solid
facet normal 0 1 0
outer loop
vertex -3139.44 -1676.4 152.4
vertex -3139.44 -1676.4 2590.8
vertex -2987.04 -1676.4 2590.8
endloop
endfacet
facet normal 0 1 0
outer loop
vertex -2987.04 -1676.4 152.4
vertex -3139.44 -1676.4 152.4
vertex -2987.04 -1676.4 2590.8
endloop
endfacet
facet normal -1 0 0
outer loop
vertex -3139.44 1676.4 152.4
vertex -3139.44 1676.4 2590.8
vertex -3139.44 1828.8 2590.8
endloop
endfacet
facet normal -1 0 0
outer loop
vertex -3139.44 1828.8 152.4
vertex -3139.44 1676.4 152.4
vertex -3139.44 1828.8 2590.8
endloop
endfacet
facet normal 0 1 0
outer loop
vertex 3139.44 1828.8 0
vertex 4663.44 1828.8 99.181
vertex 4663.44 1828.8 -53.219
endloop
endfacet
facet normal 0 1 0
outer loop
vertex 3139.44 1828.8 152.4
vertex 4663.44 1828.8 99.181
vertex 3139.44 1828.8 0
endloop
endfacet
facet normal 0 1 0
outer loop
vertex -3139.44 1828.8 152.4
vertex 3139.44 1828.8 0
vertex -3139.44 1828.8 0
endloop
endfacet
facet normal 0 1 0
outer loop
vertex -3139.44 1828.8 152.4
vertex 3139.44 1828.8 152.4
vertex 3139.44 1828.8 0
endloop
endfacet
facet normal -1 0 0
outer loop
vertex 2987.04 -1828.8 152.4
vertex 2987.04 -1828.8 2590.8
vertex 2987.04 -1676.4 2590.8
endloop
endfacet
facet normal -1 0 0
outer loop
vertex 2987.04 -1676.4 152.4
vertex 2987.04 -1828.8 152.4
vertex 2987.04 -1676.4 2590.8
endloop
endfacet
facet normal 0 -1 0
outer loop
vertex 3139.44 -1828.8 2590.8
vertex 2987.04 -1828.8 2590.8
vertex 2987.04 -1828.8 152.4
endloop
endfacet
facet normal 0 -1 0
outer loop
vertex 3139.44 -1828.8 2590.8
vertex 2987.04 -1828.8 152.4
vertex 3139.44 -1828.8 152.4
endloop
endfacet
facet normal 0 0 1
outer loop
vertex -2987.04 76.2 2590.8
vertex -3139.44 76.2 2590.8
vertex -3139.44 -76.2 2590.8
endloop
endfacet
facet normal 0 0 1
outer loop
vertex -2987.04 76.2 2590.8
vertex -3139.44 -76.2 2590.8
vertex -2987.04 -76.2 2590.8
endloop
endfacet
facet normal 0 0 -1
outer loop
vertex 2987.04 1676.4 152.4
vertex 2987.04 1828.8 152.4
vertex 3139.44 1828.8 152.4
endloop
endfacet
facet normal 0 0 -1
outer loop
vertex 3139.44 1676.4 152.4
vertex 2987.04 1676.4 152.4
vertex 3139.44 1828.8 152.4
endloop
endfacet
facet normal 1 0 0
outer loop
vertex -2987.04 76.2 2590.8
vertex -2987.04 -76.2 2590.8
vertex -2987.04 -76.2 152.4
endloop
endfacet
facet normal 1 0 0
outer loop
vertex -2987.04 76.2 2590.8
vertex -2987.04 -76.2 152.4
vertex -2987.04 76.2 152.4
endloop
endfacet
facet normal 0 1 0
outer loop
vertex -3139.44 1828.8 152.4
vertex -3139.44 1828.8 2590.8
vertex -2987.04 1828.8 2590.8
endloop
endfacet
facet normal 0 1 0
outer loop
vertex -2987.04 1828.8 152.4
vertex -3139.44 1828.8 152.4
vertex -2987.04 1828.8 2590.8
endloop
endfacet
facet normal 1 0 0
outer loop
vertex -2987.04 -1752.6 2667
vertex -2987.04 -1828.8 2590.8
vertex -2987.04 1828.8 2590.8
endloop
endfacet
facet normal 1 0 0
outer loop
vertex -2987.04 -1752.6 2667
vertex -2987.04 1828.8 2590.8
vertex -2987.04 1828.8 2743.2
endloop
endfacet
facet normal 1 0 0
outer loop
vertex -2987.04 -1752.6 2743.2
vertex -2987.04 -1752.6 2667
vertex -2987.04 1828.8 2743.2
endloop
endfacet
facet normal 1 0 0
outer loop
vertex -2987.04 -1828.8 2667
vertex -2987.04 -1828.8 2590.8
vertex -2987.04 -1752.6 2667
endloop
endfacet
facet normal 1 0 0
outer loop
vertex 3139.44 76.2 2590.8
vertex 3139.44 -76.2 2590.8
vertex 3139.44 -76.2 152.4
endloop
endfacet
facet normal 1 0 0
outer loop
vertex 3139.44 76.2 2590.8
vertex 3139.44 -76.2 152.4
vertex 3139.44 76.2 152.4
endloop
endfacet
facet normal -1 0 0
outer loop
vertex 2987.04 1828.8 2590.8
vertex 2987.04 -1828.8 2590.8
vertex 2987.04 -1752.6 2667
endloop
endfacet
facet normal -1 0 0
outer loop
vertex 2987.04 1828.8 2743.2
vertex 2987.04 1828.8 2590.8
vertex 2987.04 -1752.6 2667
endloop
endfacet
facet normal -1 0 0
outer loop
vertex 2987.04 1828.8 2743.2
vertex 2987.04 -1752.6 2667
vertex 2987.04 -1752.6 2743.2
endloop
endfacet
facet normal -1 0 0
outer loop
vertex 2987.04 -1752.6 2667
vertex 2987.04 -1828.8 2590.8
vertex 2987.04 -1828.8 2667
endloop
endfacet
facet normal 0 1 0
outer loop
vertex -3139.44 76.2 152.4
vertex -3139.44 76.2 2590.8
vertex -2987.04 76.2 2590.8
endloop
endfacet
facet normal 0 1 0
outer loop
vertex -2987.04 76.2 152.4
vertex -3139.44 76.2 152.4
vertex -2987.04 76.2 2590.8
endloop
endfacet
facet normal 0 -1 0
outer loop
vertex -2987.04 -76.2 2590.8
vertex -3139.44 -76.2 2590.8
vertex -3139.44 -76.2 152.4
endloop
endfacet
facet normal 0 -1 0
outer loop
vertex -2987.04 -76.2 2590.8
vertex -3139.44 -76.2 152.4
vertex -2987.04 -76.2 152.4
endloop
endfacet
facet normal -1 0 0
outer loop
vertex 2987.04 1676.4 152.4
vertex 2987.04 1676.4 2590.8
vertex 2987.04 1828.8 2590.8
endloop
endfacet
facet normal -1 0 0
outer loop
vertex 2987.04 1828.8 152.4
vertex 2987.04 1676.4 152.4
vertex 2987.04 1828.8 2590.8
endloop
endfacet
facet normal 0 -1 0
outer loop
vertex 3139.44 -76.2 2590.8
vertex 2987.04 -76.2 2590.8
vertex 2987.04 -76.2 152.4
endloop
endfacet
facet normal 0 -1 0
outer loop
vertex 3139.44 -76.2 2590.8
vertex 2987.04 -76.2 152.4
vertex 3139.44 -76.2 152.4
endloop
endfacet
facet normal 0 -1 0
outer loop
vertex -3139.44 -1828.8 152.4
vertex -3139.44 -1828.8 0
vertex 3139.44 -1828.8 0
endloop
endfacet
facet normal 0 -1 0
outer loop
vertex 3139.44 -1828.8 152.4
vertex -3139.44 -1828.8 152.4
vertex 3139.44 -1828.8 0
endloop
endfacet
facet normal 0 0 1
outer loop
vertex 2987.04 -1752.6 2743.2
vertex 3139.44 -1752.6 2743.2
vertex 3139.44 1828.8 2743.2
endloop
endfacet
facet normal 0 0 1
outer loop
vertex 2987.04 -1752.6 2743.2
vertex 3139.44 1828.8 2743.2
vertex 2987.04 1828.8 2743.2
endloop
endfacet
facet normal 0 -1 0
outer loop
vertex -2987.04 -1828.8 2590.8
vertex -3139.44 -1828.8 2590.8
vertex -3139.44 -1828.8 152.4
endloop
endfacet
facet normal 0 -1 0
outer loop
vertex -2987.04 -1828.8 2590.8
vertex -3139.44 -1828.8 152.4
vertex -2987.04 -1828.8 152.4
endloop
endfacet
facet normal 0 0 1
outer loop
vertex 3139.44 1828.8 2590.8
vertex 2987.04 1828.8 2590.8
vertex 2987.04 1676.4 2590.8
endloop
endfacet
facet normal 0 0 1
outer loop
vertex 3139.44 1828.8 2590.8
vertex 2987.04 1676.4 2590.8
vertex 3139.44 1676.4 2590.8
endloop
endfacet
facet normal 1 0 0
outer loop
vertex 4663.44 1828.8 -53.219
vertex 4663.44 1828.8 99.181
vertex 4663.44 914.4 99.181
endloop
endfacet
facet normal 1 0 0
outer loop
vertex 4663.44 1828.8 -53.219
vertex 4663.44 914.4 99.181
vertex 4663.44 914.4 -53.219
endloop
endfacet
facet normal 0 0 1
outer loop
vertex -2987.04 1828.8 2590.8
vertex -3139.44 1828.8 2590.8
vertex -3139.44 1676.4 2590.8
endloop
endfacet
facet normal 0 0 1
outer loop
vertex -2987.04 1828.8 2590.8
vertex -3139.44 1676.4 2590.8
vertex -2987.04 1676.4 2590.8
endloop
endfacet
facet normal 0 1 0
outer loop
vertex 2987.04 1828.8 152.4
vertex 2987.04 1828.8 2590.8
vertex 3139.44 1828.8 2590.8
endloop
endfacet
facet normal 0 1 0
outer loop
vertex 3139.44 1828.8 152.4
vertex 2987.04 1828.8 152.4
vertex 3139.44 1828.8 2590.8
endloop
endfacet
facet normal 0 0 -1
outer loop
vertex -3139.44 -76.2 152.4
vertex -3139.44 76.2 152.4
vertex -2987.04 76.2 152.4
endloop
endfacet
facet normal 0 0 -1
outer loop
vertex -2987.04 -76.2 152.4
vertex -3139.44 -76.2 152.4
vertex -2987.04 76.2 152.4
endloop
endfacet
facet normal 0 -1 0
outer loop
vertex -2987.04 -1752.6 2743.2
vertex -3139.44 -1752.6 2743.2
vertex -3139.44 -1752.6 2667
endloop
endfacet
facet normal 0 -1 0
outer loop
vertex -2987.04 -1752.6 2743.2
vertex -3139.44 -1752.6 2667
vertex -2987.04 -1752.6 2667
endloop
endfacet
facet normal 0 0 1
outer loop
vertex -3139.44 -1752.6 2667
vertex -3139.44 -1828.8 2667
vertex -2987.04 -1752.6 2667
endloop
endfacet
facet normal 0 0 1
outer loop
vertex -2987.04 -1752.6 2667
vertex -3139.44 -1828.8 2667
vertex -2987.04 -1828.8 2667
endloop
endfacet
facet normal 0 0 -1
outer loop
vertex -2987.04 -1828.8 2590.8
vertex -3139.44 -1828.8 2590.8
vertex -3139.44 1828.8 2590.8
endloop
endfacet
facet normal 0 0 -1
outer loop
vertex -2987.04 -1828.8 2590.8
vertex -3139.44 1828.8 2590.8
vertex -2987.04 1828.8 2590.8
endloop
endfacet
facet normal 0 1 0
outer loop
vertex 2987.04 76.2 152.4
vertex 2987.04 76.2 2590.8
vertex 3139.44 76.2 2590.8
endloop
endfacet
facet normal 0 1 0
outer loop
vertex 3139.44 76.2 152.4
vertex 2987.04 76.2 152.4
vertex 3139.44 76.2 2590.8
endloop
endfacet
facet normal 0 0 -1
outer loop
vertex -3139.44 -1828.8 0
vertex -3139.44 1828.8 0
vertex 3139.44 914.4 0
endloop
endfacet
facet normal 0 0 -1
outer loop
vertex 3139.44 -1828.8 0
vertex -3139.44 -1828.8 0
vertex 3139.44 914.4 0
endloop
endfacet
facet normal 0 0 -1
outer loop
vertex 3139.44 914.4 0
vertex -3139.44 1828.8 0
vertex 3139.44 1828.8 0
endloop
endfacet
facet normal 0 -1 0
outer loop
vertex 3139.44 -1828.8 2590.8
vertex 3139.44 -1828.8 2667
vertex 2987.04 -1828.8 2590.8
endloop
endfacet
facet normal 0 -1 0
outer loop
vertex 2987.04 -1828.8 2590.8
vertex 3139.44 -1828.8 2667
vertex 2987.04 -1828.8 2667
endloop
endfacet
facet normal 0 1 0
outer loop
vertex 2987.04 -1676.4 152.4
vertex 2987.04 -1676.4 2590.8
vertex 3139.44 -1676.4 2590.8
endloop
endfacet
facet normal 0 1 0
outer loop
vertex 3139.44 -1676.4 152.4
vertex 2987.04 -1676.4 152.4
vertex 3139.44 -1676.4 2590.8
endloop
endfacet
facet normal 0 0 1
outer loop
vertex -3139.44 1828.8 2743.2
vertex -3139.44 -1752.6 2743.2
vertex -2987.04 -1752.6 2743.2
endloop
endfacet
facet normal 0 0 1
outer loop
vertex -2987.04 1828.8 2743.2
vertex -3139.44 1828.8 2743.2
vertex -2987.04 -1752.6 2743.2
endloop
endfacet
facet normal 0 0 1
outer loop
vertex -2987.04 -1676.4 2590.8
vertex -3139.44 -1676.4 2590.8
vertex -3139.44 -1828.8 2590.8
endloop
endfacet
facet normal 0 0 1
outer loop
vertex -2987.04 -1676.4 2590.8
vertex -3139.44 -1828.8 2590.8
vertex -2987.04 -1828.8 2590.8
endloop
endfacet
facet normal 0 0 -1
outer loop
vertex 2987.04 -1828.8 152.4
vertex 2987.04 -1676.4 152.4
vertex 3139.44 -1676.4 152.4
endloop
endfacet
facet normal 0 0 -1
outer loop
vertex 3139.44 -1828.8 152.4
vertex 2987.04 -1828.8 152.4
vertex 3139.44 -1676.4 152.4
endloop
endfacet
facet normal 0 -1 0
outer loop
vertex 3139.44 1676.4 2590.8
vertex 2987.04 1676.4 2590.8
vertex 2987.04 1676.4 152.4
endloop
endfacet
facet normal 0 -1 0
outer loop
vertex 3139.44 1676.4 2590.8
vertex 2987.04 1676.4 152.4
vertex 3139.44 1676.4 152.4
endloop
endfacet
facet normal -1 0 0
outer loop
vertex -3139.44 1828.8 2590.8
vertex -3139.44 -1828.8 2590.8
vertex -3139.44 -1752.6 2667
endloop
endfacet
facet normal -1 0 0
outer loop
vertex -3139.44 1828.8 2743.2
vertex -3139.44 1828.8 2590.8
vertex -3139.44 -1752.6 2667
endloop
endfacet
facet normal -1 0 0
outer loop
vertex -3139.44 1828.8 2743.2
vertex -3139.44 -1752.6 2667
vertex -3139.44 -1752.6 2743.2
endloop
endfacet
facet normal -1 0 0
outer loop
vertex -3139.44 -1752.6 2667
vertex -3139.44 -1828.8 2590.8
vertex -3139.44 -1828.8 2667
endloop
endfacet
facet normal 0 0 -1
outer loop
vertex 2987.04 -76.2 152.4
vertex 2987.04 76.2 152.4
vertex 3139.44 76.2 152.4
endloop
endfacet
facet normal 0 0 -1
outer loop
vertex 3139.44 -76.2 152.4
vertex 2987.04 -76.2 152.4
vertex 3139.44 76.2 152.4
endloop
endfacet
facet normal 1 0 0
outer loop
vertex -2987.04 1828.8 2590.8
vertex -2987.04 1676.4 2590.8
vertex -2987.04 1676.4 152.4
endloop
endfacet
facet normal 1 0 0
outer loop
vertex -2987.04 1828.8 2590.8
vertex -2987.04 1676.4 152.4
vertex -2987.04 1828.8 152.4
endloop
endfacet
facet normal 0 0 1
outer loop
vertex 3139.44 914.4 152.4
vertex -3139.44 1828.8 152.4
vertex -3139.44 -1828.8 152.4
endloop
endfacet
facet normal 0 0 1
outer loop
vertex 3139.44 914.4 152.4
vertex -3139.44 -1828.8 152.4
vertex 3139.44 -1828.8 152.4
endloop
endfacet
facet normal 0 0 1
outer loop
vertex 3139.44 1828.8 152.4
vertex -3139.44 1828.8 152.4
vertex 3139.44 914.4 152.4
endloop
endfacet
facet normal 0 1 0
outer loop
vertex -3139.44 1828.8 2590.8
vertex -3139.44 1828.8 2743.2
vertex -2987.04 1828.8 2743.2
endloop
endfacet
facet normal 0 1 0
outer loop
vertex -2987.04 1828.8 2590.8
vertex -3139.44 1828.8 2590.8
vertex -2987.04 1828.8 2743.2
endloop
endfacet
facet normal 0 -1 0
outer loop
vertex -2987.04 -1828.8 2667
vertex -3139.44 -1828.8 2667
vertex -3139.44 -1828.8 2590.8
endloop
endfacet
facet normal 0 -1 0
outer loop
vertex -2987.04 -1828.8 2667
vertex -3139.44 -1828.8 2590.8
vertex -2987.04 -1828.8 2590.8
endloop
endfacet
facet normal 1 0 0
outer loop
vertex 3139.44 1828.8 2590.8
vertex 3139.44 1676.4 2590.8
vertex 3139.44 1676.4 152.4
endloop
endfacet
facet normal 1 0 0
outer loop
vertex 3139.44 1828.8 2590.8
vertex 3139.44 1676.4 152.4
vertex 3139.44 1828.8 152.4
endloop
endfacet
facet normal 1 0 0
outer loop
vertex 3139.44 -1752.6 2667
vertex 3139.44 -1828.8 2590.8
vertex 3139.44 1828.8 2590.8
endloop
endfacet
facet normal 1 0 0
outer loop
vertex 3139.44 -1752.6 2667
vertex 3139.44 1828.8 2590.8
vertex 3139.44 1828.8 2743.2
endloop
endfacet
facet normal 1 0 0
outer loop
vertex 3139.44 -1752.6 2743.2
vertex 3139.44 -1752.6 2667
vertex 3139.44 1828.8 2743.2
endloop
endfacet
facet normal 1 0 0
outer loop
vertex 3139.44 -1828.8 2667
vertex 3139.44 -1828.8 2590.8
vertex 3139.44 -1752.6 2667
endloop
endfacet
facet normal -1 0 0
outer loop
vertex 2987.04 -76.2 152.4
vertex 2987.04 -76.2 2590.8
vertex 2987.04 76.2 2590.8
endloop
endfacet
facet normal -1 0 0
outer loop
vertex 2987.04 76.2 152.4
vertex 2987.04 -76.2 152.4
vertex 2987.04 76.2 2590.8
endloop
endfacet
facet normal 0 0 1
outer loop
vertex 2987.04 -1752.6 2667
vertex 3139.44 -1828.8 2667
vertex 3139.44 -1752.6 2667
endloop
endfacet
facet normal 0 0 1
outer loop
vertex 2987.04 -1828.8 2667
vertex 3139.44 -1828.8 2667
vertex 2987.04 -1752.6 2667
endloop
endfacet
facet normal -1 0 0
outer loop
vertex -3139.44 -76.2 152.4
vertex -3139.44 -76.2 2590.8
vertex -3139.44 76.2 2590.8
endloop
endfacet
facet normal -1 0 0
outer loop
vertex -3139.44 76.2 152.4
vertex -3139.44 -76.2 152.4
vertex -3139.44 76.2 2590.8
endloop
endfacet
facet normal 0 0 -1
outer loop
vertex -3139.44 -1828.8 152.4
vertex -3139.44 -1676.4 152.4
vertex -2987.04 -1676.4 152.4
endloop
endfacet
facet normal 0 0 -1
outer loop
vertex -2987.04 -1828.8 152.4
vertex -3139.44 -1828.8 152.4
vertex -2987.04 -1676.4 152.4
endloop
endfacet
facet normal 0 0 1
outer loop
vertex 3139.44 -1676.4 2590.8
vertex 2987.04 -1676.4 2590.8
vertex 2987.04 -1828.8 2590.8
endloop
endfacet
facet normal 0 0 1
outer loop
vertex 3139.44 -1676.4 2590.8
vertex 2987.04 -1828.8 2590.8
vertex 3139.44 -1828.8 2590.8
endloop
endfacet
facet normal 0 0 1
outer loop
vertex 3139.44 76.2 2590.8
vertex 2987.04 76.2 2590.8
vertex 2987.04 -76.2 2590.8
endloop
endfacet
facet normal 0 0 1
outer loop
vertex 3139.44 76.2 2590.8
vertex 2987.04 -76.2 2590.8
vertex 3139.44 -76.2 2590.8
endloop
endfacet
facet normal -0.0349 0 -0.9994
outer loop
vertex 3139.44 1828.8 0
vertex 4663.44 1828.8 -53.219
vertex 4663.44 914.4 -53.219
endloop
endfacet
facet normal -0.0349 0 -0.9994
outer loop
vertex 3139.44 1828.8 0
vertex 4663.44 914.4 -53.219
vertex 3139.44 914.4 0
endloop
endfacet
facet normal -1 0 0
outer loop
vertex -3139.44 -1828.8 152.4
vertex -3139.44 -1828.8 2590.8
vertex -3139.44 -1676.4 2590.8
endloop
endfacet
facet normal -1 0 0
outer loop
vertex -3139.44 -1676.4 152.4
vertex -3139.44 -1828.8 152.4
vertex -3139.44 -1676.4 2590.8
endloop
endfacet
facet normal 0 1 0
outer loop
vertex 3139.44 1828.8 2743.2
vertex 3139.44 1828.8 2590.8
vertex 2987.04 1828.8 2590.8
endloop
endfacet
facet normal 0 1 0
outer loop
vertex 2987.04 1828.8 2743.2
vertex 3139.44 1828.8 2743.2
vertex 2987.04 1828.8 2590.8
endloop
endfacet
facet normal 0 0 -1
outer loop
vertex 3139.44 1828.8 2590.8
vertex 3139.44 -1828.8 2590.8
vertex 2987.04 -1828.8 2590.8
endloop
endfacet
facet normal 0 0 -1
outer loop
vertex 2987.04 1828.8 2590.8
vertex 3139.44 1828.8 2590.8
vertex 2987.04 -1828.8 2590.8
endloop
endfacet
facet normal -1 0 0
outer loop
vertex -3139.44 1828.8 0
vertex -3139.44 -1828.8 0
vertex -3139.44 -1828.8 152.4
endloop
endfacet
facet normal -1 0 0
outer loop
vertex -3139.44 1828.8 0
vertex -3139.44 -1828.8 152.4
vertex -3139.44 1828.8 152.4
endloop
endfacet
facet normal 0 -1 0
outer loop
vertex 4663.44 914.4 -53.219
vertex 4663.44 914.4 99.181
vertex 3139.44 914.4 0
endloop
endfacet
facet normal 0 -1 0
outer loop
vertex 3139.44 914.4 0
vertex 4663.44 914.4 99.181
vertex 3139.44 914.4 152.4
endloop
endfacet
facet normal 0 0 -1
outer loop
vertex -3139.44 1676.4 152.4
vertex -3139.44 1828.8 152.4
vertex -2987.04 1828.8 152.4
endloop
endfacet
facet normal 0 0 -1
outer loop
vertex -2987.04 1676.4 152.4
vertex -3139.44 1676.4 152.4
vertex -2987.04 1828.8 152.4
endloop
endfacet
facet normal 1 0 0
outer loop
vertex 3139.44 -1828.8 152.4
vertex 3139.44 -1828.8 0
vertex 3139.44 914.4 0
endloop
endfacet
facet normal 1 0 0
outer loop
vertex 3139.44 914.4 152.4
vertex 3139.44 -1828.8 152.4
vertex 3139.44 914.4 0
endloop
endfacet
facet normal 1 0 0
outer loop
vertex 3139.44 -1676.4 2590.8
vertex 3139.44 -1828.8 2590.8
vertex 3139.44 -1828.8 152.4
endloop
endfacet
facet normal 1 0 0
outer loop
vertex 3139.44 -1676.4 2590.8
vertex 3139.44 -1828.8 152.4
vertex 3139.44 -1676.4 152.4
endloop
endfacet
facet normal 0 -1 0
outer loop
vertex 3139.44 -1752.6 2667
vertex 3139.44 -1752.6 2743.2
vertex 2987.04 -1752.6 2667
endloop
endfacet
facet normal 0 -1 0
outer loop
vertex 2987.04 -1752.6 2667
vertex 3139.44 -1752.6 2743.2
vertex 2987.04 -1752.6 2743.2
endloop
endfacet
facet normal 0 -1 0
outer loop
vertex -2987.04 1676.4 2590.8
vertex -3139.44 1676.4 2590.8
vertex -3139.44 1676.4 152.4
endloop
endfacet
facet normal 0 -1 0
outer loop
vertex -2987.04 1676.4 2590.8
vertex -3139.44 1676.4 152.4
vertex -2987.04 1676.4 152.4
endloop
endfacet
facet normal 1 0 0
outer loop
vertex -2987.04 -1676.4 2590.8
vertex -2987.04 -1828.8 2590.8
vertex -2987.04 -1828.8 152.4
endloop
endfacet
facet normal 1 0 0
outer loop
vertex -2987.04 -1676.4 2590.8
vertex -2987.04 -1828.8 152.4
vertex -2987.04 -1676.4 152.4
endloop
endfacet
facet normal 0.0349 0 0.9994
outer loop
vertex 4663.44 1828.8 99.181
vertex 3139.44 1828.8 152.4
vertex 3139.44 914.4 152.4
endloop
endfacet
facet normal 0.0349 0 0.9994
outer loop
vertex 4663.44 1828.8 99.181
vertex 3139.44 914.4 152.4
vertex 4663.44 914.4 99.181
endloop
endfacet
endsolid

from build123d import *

# Parameters (mm, degrees)
F0_W      = 6278.88
F0_H      = 3657.6
F1_DEPTH  = 152.4
F2_W      = 152.4
F2_H      = 152.4
F3_DEPTH  = 2438.4
F4_W      = 152.4
F4_H      = 152.4
F5_DEPTH  = 2438.4
F7_DEPTH  = 914.4
F8_W      = 152.4
F8_H      = 152.4
F9_DEPTH  = 3657.6
F10_W     = 152.4
F10_H     = 76.2
F11_DEPTH = 76.2


with BuildPart() as f1:
    # F0 (on Top) → F1 (new body)
    with BuildSketch(Plane.XY):
        Rectangle(F0_W, F0_H)
    extrude(amount=F1_DEPTH)

    # F6 (on face) → F7 (join)
    with BuildSketch(Plane(origin=(0, 1828.8, 0), x_dir=(-1, 0, 0), z_dir=(0, 1, 0))):
        Polygon((-3139.44, 0), (-3139.44, 152.4), (-4663.44, 99.1807472946), (-4663.44, -53.2192527054), align=None)
    extrude(amount=-F7_DEPTH)


with BuildPart() as f3:
    # F2 (on face) → F3 (new body)
    with BuildSketch(Plane.XY.offset(152.4)):
        with Locations((-3063.24, -1752.6)):
            Rectangle(F2_W, F2_H)
    extrude(amount=F3_DEPTH)


with BuildPart() as f3b:
    # F2 (on face) → F3, piece 2 (new body)
    with BuildSketch(Plane.XY.offset(152.4)):
        with Locations((-3063.24, 1752.6)):
            Rectangle(F2_W, F2_H)
    extrude(amount=F3_DEPTH)


with BuildPart() as f3c:
    # F2 (on face) → F3, piece 3 (new body)
    with BuildSketch(Plane.XY.offset(152.4)):
        with Locations((3063.24, 1752.6)):
            Rectangle(F2_W, F2_H)
    extrude(amount=F3_DEPTH)


with BuildPart() as f3d:
    # F2 (on face) → F3, piece 4 (new body)
    with BuildSketch(Plane.XY.offset(152.4)):
        with Locations((3063.24, -1752.6)):
            Rectangle(F2_W, F2_H)
    extrude(amount=F3_DEPTH)


with BuildPart() as f5:
    # F4 (on face) → F5 (new body)
    with BuildSketch(Plane.XY.offset(152.4)):
        with Locations((-3063.24, 0)):
            Rectangle(F4_W, F4_H)
    extrude(amount=F5_DEPTH)


with BuildPart() as f5b:
    # F4 (on face) → F5, piece 2 (new body)
    with BuildSketch(Plane.XY.offset(152.4)):
        with Locations((3063.24, 0)):
            Rectangle(F4_W, F4_H)
    extrude(amount=F5_DEPTH)


with BuildPart() as f9:
    # F8 (on face) → F9 (new body)
    with BuildSketch(Plane.XZ.offset(1828.8)):
        with Locations((-3063.24, 2667)):
            Rectangle(F8_W, F8_H)
    extrude(amount=-F9_DEPTH)

    # F10 (on face) → F11 (cut)
    with BuildSketch(Plane.XZ.offset(1828.8)):
        with Locations((-3063.24, 2705.1)):
            Rectangle(F10_W, F10_H)
    extrude(amount=-F11_DEPTH, mode=Mode.SUBTRACT)


with BuildPart() as f12_1:
    # F12: instance of F9
    add(f9.part.mirror(Plane.YZ))


solid = Compound([f1.part, f3.part, f3b.part, f3c.part, f3d.part, f5.part, f5b.part, f9.part, f12_1.part])
